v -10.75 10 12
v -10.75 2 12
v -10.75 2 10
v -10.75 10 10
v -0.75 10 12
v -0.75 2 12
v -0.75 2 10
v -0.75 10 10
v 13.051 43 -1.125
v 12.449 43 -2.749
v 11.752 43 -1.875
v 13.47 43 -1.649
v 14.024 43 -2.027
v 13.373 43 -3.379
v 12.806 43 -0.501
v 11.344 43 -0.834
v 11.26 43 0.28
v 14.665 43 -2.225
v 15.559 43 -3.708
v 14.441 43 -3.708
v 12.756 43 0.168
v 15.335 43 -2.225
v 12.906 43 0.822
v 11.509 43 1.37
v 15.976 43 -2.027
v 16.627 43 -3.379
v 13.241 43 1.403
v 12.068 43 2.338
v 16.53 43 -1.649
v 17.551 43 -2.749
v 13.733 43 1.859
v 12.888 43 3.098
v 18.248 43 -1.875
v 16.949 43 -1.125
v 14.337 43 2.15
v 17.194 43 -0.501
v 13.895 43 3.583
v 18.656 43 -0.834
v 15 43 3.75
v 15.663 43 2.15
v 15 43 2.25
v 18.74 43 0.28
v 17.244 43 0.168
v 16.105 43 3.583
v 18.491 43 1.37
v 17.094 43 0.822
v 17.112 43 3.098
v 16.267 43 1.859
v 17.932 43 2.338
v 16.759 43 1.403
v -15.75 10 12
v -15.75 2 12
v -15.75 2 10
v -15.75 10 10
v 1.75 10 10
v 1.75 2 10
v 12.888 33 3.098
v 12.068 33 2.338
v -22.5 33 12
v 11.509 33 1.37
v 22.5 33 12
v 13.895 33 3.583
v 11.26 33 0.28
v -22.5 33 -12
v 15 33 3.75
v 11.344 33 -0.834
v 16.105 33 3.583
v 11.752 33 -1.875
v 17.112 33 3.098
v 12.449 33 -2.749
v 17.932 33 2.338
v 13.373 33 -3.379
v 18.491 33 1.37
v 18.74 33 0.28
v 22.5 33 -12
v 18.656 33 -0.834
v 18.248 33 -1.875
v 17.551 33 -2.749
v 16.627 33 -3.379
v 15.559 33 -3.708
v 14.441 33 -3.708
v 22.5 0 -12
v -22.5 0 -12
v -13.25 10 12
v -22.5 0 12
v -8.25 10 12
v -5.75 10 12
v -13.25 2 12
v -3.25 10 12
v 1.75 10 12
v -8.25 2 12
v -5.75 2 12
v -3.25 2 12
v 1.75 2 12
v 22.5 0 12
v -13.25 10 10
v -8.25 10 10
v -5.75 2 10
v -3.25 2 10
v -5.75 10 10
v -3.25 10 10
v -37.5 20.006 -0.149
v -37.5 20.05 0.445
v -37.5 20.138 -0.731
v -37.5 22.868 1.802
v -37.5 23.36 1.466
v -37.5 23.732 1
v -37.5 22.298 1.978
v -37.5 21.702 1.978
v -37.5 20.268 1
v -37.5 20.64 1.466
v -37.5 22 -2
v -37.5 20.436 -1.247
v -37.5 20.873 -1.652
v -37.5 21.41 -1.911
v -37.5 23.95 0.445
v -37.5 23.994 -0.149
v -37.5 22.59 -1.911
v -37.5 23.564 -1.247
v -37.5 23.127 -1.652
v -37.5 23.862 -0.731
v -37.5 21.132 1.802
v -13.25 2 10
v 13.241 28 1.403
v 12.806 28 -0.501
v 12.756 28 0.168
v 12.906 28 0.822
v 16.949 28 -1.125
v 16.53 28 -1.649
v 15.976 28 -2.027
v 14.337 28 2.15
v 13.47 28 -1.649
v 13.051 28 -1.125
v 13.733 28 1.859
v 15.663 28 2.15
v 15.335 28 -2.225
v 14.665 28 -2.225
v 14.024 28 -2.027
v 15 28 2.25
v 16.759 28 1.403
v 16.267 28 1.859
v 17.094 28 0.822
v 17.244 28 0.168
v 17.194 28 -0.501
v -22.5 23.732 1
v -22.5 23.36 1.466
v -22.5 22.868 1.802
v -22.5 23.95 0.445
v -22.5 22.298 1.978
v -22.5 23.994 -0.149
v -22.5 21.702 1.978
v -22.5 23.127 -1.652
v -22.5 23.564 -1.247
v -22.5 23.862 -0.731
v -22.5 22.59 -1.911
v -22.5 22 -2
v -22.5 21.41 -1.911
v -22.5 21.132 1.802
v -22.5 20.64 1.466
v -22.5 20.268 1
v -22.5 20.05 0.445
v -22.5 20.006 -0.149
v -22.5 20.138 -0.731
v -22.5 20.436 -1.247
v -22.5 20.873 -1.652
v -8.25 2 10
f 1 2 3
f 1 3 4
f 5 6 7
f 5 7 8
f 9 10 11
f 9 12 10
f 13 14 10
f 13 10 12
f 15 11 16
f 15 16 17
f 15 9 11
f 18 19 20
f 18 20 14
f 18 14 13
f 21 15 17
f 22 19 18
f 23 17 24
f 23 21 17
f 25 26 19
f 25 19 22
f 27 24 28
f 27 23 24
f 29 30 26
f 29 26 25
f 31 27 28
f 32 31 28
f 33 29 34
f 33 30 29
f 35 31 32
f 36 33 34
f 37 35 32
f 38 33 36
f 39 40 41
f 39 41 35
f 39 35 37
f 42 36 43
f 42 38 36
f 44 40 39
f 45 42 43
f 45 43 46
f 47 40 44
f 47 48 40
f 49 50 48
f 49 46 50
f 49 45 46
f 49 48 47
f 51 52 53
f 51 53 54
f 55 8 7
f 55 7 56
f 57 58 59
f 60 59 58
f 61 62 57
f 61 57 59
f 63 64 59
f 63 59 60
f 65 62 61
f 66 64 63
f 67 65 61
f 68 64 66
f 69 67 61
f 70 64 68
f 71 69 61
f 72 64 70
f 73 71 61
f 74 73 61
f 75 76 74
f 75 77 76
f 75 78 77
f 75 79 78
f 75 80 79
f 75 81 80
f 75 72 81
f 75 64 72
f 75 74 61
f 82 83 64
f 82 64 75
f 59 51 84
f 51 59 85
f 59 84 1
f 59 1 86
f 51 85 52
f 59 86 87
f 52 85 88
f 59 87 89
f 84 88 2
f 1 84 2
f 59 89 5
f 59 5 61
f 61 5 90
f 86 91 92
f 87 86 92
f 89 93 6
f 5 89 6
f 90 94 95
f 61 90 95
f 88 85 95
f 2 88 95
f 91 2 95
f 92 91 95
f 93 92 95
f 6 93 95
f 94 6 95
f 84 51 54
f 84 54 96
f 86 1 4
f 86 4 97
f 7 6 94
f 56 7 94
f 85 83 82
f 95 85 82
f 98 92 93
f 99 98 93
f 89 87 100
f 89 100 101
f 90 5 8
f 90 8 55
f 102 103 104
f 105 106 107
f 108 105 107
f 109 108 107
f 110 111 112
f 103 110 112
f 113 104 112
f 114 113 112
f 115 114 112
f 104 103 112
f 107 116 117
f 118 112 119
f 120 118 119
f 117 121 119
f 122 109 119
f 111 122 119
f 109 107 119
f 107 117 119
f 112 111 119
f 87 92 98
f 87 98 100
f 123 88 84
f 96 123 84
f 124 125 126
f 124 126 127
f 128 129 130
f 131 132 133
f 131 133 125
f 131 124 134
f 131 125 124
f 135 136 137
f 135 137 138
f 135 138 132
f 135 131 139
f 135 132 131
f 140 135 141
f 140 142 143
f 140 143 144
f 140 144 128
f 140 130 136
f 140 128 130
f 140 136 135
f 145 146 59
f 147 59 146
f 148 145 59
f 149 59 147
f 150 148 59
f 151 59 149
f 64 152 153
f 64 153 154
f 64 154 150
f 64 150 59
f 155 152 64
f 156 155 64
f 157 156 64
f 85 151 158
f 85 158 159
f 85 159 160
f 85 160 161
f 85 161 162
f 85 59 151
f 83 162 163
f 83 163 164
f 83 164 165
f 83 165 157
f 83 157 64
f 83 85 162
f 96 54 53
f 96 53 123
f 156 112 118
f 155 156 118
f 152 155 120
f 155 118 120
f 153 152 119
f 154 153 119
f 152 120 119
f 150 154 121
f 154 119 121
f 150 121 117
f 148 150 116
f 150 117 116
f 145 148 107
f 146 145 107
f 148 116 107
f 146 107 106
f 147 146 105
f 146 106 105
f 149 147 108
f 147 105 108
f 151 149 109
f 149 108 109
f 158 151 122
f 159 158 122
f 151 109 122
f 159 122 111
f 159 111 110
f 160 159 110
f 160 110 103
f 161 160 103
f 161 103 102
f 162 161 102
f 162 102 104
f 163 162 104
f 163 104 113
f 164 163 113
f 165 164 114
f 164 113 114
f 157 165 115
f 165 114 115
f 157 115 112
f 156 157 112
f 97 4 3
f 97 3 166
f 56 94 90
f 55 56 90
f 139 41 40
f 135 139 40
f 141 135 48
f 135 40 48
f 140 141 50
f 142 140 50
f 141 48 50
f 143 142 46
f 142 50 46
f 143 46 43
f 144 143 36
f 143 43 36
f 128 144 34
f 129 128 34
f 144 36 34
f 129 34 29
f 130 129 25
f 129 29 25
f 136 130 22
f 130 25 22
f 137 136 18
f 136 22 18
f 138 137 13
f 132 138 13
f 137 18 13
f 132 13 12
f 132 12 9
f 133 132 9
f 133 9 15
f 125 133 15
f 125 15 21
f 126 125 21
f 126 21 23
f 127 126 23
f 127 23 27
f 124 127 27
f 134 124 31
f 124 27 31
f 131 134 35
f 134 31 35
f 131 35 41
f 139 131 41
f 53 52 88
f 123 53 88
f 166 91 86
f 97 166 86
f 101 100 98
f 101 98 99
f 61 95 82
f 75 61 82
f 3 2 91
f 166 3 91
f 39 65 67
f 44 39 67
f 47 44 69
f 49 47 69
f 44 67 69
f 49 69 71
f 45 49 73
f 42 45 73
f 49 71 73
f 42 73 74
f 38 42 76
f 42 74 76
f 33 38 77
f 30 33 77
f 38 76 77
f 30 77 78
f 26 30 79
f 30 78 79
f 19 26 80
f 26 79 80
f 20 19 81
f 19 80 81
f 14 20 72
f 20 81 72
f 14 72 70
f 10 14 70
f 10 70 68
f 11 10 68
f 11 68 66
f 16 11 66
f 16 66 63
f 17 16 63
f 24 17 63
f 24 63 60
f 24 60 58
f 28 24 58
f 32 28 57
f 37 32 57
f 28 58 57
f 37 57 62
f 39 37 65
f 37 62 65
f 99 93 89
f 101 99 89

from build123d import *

# Parameters (mm, degrees)
SKETCH1_W         = 45
SKETCH1_H         = 24
PUMP_BODY_DEPTH   = 33
OUTLET_START      = 33
SKETCH2_R         = 3.75
OUTLET_DEPTH      = 10
OUTLET_BORE_START = 43
SKETCH3_R         = 2.25
OUTLET_BORE_DEPTH = 15
INLET_SLOTS_START = 12
SKETCH4_W         = 2.5
SKETCH4_H         = 8
INLET_SLOTS_DEPTH = 2
CABLE_STUB_START  = -37.5
SKETCH5_R         = 2
CABLE_STUB_DEPTH  = 15


with BuildPart() as part:
    # Sketch1 → Pump_Body (new body)
    with BuildSketch(Plane(origin=(0, 0, 0), x_dir=(1, 0, 0), z_dir=(0, 1, 0))):
        Rectangle(SKETCH1_W, SKETCH1_H)
    extrude(amount=PUMP_BODY_DEPTH)

    # Sketch2 → Outlet (add)
    with BuildSketch(Plane(origin=(0, 0, 0), x_dir=(1, 0, 0), z_dir=(0, 1, 0)).offset(OUTLET_START)):
        with Locations(Location((15, 0, 0), (0, 0, 270))):
            Circle(SKETCH2_R)
    extrude(amount=OUTLET_DEPTH)

    # Sketch3 → Outlet_Bore (cut)
    with BuildSketch(Plane(origin=(0, 0, 0), x_dir=(1, 0, 0), z_dir=(0, 1, 0)).offset(OUTLET_BORE_START)):
        with Locations(Location((15, 0, 0), (0, 0, 270))):
            Circle(SKETCH3_R)
    extrude(amount=-OUTLET_BORE_DEPTH, mode=Mode.SUBTRACT)

    # Sketch4 → Inlet_Slots (cut)
    with BuildSketch(Plane.XY.offset(INLET_SLOTS_START)):
        with Locations((-14.5, 6)):
            Rectangle(SKETCH4_W, SKETCH4_H)
        with Locations((-9.5, 6)):
            Rectangle(SKETCH4_W, SKETCH4_H)
        with Locations((-4.5, 6)):
            Rectangle(SKETCH4_W, SKETCH4_H)
        with Locations((0.5, 6)):
            Rectangle(SKETCH4_W, SKETCH4_H)
    extrude(amount=-INLET_SLOTS_DEPTH, mode=Mode.SUBTRACT)

    # Sketch5 → Cable_Stub (add)
    with BuildSketch(Plane(origin=(0, 0, 0), x_dir=(0, 0, -1), z_dir=(1, 0, 0)).offset(CABLE_STUB_START)):
        with Locations((0, 22)):
            Circle(SKETCH5_R)
    extrude(amount=CABLE_STUB_DEPTH)


solid = part.part
